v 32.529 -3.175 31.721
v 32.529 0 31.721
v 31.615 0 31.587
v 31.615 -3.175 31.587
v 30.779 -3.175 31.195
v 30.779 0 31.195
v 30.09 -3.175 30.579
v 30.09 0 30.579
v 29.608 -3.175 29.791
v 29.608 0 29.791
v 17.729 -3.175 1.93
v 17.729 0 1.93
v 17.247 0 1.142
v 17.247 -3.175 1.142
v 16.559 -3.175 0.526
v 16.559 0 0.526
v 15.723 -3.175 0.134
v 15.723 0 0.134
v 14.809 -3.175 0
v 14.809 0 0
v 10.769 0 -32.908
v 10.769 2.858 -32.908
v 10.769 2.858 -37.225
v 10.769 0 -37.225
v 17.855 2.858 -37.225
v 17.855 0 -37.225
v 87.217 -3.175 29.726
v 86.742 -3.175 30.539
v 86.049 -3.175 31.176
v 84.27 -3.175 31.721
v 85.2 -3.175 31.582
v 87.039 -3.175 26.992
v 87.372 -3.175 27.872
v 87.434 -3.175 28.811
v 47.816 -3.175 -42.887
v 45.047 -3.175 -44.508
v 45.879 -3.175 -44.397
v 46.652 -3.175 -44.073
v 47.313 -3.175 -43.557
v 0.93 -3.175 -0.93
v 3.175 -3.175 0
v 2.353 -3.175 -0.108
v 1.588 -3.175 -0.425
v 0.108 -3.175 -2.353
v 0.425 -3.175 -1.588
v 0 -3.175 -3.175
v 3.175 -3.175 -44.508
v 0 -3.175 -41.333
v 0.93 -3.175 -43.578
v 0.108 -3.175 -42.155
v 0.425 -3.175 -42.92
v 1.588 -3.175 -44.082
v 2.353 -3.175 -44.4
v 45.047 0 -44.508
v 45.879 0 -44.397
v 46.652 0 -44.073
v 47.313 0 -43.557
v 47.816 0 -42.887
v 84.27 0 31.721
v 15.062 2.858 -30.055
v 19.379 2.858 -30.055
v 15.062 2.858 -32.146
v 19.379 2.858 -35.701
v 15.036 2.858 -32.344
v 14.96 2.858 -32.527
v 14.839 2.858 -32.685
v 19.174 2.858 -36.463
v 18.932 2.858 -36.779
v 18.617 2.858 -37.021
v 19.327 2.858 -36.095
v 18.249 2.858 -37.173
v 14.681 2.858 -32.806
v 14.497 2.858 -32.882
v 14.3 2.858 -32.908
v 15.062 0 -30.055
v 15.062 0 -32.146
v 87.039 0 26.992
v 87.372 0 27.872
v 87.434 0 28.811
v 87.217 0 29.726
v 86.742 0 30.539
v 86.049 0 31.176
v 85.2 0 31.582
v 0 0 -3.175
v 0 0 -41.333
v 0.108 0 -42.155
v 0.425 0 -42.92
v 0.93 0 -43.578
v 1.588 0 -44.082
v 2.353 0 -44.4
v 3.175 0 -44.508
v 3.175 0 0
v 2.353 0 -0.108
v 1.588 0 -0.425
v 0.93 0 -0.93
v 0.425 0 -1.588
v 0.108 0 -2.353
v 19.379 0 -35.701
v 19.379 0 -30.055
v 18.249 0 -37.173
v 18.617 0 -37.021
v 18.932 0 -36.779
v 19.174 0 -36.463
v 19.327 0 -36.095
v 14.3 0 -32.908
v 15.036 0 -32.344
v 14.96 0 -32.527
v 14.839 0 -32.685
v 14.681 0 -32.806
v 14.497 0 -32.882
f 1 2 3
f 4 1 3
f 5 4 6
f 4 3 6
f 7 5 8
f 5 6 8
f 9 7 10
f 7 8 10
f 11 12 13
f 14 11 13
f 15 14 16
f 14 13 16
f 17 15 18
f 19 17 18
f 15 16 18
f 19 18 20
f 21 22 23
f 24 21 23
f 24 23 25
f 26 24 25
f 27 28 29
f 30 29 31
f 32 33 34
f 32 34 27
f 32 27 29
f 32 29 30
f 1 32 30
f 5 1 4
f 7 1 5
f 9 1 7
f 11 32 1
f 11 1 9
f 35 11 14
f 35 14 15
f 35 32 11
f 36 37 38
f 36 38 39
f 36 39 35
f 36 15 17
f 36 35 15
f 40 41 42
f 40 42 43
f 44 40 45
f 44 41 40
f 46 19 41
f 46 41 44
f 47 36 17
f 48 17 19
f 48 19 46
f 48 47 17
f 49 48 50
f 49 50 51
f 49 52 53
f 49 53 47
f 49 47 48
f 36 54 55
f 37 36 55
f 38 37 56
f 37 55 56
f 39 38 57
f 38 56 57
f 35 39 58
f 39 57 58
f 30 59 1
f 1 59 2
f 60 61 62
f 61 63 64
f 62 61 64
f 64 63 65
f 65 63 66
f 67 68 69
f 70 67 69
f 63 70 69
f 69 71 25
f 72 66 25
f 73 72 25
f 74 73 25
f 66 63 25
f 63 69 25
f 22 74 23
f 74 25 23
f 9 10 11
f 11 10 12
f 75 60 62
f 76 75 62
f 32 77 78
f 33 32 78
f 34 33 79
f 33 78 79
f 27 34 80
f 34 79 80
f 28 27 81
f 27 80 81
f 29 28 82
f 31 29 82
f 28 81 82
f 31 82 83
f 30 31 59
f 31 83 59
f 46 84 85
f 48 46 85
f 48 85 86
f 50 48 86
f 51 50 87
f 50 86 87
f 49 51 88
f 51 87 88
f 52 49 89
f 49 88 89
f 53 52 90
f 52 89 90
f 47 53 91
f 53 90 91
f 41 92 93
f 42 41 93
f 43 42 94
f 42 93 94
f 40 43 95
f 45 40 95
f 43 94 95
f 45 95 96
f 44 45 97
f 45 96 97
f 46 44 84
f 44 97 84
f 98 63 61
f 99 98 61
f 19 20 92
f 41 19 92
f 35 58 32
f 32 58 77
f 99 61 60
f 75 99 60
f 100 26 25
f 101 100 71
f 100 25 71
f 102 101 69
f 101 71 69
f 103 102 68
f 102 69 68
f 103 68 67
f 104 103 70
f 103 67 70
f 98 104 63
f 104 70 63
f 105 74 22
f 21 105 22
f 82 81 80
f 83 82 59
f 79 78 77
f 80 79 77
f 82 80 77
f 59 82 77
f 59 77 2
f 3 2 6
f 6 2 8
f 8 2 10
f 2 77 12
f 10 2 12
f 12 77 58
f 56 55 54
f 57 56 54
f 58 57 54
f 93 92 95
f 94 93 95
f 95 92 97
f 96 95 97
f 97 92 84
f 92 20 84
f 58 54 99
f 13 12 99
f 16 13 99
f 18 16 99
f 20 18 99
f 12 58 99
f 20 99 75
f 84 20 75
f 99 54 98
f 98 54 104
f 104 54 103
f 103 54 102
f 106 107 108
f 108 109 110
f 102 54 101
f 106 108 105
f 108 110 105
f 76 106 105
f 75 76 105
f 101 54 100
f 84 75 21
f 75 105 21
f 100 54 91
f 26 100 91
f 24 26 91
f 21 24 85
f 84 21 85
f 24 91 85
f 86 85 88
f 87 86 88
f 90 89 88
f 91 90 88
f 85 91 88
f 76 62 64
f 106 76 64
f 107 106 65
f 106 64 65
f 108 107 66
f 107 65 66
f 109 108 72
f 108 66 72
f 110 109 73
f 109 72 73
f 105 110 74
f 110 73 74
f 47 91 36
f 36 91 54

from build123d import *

# Parameters (mm, degrees)
EXTRUDE1_DEPTH = 3.175
EXTRUDE2_DEPTH = 2.8575


with BuildPart() as part:
    # Sketch1 → Extrude1 (new body)
    with BuildSketch(Plane(origin=(0, 0, 0), x_dir=(1, 0, 0), z_dir=(0, 1, 0))):
        with BuildLine():
            Line((3.175, 44.50785877), (45.047498502, 44.50785877))
            ThreePointArc((45.047498502, 44.50785877), (46.651643951, 44.072811758), (47.81618078, 42.886893339))
            Line((47.81618078, 42.886893339), (87.038547596, -26.992036046))
            ThreePointArc((87.038547596, -26.992036046), (87.009818306, -30.150216064), (84.269865318, -31.721070615))
            Line((84.269865318, -31.721070615), (32.528914715, -31.721070615))
            ThreePointArc((32.528914715, -31.721070615), (30.778624678, -31.195053398), (29.608292243, -29.791297251))
            Line((29.608292243, -29.791297251), (17.72934795, -1.929773364))
            ThreePointArc((17.72934795, -1.929773364), (16.559015516, -0.526017217), (14.808725478, 0))
            Line((14.808725478, 0), (3.175, 0))
            ThreePointArc((3.175, 0), (0.92993597, 0.92993597), (0, 3.175))
            Line((0, 3.175), (0, 41.33285877))
            ThreePointArc((0, 41.33285877), (0.92993597, 43.5779228), (3.175, 44.50785877))
        make_face()
    extrude(amount=-EXTRUDE1_DEPTH)

    # Sketch4 → Extrude2 (add, symmetric)
    with BuildSketch(Plane(origin=(0, 0, 0), x_dir=(1, 0, 0), z_dir=(0, 1, 0))):
        with BuildLine():
            Line((10.768757098, 37.225043705), (17.854525476, 37.225043705))
            ThreePointArc((17.854525476, 37.225043705), (18.93215621, 36.77867444), (19.378525476, 35.701043705))
            Line((19.378525476, 35.701043705), (19.378525476, 30.0552377))
            Line((19.378525476, 30.0552377), (15.061814646, 30.0552377))
            Line((15.061814646, 30.0552377), (15.061814646, 32.146332876))
            ThreePointArc((15.061814646, 32.146332876), (14.838630013, 32.685148243), (14.299814646, 32.908332876))
            Line((14.299814646, 32.908332876), (10.768757098, 32.908332876))
            Line((10.768757098, 32.908332876), (10.768757098, 37.225043705))
        make_face()
    extrude(amount=EXTRUDE2_DEPTH, both=True)


solid = part.part
